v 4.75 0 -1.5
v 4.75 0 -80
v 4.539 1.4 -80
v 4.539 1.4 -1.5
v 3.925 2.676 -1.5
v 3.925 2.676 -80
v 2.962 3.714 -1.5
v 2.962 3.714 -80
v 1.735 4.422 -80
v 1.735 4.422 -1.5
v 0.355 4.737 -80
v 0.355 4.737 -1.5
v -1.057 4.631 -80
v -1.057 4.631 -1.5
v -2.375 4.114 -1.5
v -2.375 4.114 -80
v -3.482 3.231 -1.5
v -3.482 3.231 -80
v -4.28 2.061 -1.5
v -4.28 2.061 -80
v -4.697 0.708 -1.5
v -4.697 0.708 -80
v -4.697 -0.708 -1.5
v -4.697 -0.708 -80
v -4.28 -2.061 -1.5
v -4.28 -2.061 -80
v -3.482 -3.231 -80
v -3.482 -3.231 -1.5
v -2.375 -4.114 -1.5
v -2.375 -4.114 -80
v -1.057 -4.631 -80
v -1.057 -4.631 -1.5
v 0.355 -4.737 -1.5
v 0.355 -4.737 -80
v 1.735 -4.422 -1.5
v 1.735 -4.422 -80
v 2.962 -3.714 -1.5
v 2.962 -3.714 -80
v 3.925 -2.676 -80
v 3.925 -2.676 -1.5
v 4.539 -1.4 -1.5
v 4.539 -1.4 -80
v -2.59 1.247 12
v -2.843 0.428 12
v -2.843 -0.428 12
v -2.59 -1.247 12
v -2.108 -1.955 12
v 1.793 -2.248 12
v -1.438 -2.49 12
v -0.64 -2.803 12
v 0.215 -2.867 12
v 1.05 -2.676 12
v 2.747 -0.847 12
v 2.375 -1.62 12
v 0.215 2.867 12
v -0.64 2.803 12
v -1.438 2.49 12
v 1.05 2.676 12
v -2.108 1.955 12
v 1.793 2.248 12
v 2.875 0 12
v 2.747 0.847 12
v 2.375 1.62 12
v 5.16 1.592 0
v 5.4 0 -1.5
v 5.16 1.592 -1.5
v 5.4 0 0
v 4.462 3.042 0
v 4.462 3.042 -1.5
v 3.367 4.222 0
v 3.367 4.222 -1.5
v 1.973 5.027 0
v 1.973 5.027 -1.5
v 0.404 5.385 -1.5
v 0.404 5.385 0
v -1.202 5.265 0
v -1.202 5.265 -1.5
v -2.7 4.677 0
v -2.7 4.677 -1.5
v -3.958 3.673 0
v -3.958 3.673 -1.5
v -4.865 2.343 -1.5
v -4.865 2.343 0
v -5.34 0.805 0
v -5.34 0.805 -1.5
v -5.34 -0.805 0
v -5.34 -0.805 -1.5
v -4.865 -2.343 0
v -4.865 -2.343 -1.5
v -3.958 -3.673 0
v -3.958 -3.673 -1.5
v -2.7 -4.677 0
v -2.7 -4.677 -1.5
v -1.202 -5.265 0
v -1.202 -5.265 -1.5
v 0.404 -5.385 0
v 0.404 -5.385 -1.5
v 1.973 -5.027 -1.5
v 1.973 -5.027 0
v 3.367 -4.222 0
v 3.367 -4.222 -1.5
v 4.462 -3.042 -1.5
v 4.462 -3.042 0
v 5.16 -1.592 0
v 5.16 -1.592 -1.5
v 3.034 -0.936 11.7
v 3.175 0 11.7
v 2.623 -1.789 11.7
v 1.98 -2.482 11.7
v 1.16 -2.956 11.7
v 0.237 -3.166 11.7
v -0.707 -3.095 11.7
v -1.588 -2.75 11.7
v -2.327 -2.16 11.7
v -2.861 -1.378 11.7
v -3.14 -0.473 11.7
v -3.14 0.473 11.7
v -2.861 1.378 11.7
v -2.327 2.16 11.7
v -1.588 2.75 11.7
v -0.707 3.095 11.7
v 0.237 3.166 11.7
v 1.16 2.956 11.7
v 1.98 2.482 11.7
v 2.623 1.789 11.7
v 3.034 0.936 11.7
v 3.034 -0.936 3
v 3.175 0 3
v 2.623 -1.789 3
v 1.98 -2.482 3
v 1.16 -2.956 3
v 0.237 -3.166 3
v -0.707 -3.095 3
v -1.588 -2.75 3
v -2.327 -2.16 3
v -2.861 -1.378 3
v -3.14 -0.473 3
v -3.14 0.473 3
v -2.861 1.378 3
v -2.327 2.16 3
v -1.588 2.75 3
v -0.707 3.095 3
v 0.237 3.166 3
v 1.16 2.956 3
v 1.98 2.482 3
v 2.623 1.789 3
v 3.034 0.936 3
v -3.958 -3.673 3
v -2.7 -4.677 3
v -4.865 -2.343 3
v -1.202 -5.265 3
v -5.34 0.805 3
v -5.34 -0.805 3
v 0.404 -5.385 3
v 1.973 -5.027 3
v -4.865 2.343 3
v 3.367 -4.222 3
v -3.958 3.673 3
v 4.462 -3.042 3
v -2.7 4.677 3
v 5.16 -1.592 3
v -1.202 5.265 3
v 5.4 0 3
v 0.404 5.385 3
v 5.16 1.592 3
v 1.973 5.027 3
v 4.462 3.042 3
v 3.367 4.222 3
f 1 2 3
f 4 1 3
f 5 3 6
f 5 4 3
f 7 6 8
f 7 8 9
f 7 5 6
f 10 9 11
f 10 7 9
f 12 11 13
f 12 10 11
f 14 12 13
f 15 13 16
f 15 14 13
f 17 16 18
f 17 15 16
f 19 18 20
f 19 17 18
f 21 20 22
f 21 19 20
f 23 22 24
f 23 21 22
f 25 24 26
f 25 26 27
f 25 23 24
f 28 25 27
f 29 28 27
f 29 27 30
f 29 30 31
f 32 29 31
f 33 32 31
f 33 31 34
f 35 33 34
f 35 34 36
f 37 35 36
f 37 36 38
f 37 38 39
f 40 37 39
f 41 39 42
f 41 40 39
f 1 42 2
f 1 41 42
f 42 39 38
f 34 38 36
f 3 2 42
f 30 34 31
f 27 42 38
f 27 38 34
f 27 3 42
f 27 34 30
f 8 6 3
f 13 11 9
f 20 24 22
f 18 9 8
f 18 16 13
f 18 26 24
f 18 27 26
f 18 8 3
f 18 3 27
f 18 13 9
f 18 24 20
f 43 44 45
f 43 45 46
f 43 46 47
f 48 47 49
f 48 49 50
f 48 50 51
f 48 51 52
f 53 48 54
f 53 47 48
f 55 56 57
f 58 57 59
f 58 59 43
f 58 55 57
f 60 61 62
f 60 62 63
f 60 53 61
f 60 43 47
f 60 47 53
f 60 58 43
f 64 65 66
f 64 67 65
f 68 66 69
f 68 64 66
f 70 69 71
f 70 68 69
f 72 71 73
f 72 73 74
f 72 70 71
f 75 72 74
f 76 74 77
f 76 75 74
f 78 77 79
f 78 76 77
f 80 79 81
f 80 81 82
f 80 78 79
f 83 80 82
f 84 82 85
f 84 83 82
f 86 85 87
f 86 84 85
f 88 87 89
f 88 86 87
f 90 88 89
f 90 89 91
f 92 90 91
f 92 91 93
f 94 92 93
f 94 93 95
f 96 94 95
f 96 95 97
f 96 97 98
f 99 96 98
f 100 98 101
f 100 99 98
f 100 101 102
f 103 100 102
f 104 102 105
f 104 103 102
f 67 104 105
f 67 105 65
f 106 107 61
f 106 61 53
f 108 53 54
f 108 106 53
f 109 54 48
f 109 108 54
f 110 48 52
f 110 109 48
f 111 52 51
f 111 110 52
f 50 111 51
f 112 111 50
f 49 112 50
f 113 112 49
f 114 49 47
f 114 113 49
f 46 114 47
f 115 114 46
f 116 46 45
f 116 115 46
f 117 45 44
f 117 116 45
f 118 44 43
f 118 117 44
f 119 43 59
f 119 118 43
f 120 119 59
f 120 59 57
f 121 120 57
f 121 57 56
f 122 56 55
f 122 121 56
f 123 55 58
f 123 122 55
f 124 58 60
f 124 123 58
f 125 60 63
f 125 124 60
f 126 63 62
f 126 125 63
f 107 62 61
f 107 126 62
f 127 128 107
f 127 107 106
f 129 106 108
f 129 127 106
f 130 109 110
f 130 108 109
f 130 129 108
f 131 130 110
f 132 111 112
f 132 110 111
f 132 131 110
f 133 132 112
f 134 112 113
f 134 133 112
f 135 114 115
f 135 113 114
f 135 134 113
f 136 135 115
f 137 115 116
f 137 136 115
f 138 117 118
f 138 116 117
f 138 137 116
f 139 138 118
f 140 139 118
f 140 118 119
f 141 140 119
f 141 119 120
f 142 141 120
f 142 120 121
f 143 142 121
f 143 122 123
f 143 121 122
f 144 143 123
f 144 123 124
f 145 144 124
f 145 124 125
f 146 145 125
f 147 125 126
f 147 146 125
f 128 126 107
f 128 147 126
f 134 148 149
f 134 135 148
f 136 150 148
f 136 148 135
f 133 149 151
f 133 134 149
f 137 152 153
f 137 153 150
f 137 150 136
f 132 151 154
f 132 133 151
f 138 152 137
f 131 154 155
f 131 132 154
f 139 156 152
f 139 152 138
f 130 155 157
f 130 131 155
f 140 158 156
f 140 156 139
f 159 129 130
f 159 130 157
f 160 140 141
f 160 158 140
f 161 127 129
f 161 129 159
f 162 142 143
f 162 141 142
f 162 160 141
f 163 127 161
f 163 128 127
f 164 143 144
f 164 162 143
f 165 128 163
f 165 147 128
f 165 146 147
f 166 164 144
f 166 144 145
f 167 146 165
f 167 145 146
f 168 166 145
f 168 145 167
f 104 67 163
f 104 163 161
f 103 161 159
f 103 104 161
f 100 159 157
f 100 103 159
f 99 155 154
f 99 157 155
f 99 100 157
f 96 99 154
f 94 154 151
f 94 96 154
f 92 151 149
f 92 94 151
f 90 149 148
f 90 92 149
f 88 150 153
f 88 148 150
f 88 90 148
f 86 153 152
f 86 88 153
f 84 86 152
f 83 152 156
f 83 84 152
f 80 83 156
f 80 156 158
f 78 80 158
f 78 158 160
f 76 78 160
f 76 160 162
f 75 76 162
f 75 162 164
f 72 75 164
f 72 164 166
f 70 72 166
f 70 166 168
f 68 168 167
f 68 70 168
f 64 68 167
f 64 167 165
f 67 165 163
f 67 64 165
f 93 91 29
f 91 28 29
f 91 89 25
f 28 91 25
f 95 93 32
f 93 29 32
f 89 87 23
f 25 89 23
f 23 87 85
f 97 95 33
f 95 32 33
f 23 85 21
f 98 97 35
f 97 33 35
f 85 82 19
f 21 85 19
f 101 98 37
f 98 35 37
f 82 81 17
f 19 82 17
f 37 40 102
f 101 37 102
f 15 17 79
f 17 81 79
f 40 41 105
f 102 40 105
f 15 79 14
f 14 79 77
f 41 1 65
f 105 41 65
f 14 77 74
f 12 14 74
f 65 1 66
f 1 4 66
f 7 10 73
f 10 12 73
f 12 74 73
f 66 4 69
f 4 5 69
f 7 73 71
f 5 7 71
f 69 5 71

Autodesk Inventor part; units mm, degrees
ref_plane "YZ Plane" through (0, 0, 0) normal (1, 0, 0) x (0, 1, 0)
ref_plane "XZ Plane" through (0, 0, 0) normal (0, 1, 0) x (-1, 0, 0)
ref_plane "XY Plane" through (0, 0, 0) normal (0, 0, 1) x (1, 0, 0)
sketch "Sketch1" plane through (0, 0, 0) normal (0, 0, 1) x (1, 0, 0)
  circle A0 centre (0, 0) radius 4.75
  circle A1 centre (0, 0) radius 5.4
  circle A2 centre (0, 0) radius 3.175
  dimension "d0" = 9.5
  dimension "d1" = 10.8
  dimension "d2" = 6.35
extrude "Extrusion1" add sketch "Sketch1" along normal blind 12 contours A2
extrude "Extrusion2" add sketch "Sketch1" against normal blind 80 contours A0
extrude "Extrusion3" add sketch "Sketch1" against normal blind 1.5 contours A1
sketch "Sketch2" plane through (0, 0, 0) normal (0, 0, -1) x (-1, 0, 0)
  circle A0 centre (0, 0) radius 3.175 projected
  circle A1 centre (0, 0) radius 3.175
extrude "Extrusion4" add sketch "Sketch2" along normal blind 80
chamfer "Chamfer1" distance 0.3 angle 45 1 edges at (-3.175, 0, 12)
extrude "Extrusion5" add sketch "Sketch1" along normal blind 3 contours A0 | A1
equation "\"BendRadius\" = Thickness"
equation "\"BendReliefWidth\" = Thickness"
equation "\"BendReliefDepth\" = 0.5 * Thickness"
equation "\"CornerReliefSize\" = 4 * Thickness"
equation "\"MinimumRemnant\" = 2 * Thickness"
equation "\"TransitionRadius\" = BendRadius"
equation "\"JacobiRadiusSize\" = BendRadius"
equation "\"GapSize\" = Thickness"
equation "\"Thickness\" = 0.5"
properties part number "trục đai"
